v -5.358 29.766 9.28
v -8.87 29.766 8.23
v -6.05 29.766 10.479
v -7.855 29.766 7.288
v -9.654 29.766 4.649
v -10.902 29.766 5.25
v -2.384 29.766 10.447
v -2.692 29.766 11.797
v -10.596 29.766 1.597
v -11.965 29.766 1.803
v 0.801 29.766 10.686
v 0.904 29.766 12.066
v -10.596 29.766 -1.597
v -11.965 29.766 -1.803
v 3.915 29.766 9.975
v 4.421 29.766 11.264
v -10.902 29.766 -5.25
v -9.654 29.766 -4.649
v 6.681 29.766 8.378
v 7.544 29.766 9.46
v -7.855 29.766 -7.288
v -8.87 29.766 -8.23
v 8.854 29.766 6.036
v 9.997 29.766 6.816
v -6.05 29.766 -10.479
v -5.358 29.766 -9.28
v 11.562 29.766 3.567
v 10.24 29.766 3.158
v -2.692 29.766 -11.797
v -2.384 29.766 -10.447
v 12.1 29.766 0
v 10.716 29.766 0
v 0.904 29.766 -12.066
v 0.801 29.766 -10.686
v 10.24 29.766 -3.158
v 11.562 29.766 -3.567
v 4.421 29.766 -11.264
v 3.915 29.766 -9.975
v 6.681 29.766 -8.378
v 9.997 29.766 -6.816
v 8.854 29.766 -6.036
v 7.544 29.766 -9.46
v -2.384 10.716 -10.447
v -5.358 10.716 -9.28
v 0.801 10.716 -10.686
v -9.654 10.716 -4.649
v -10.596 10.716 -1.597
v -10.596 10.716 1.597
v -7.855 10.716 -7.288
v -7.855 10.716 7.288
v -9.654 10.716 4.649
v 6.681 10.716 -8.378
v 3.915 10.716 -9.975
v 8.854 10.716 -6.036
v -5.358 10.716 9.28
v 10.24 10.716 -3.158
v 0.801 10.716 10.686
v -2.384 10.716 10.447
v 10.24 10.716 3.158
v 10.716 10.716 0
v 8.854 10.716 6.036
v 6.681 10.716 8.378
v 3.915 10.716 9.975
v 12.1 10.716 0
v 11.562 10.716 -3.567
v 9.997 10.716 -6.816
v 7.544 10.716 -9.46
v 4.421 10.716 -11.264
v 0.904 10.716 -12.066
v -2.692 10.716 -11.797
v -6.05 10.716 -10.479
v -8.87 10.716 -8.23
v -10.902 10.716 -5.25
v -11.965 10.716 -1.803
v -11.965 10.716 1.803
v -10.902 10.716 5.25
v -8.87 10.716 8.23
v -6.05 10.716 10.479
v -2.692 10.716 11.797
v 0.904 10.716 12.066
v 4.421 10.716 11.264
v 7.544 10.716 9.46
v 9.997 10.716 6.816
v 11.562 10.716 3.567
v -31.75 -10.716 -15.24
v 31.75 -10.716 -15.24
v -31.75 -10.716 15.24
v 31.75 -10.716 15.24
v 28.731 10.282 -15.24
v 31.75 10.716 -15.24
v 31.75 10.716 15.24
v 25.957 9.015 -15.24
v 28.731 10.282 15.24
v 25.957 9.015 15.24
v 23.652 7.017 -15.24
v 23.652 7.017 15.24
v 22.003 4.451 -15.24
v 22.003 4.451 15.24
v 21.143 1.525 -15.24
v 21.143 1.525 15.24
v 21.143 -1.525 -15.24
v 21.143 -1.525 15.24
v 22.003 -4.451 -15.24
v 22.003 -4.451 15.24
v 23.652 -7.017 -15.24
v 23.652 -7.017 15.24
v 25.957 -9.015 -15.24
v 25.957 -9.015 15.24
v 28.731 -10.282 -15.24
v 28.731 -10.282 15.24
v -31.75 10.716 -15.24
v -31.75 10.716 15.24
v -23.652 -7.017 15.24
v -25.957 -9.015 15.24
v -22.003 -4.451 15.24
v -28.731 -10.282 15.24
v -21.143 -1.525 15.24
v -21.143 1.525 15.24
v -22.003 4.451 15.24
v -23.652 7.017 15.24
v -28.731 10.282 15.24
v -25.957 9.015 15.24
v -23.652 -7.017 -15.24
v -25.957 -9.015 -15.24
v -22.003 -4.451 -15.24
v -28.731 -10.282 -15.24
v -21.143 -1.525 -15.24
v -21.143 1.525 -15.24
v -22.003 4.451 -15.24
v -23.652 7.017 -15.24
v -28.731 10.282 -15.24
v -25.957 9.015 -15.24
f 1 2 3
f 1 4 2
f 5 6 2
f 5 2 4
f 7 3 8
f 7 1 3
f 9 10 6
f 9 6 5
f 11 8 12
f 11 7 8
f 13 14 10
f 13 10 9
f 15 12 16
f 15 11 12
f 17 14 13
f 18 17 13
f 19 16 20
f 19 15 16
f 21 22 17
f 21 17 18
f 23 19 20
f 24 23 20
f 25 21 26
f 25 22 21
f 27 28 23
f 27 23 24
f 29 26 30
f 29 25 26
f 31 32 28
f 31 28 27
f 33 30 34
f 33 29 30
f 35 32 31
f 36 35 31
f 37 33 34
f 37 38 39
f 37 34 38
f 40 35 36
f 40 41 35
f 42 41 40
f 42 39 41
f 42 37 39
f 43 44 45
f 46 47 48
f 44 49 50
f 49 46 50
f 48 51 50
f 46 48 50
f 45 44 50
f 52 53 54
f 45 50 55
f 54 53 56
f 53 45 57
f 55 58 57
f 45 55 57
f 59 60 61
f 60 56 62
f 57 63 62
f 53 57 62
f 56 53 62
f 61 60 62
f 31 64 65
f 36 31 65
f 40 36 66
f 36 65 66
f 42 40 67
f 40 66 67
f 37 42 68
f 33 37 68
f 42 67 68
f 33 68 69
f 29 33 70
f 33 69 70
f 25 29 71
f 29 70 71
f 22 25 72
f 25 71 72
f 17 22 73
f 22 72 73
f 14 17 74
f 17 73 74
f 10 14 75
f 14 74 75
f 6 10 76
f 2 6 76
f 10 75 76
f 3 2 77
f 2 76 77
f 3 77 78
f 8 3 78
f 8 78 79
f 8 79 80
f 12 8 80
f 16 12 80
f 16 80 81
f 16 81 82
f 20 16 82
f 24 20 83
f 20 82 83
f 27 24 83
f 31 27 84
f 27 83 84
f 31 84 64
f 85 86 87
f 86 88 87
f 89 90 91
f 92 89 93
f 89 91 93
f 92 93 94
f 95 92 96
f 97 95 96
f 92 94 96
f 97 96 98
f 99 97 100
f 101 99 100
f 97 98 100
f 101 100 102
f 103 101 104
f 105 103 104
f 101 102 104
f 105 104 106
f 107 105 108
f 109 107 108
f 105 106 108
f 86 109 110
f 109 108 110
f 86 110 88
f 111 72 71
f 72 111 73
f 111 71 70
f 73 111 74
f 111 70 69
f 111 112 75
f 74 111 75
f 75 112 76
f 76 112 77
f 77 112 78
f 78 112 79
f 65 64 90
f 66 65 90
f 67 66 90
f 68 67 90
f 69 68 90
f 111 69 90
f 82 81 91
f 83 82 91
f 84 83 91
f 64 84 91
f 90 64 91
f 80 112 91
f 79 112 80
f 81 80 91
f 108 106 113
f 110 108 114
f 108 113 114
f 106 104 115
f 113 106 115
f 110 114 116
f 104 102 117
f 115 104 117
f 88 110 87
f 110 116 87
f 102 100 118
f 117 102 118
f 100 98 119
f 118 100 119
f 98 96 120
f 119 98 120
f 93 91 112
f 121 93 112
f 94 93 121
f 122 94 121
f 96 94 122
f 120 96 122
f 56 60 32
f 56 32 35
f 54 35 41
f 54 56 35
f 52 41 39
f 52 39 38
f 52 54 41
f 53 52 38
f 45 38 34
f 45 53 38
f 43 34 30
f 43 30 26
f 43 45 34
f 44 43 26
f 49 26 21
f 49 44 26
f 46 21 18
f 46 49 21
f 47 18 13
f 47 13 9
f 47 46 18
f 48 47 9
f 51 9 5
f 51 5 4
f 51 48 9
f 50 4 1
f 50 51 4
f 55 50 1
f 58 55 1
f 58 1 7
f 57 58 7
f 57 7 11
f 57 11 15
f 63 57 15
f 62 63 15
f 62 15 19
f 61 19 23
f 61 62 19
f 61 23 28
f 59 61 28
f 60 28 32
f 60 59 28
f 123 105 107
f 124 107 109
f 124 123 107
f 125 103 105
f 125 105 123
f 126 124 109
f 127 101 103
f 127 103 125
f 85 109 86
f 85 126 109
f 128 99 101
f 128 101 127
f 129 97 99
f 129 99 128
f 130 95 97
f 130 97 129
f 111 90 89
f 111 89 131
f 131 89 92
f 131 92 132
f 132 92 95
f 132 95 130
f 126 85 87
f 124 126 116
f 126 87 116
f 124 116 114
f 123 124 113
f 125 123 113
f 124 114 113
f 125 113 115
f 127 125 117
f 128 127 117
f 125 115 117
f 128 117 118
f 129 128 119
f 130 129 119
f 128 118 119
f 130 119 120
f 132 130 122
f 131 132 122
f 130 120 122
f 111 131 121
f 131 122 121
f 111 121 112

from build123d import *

# Parameters (mm, degrees)
BOSS_EXTRUDE2_DEPTH = 15.24
SKETCH3_R           = 12.099925
SKETCH3_R_2         = 10.715625
BOSS_EXTRUDE3_DEPTH = 19.05


with BuildPart() as part:
    # Sketch1 → Boss-Extrude2 (new, symmetric)
    with BuildSketch(Plane.XY):
        with BuildLine():
            Line((-31.75, 10.715625), (31.75, 10.715625))
            ThreePointArc((31.75, 10.715625), (21.034375, 0), (31.75, -10.715625))
            Line((31.75, -10.715625), (-31.75, -10.715625))
            ThreePointArc((-31.75, -10.715625), (-21.034375, 0), (-31.75, 10.715625))
        make_face()
    extrude(amount=BOSS_EXTRUDE2_DEPTH, both=True)

    # Sketch3 → Boss-Extrude3 (add)
    with BuildSketch(Plane(origin=(0, 10.715625, 0), x_dir=(1, 0, 0), z_dir=(0, 1, 0))):
        Circle(SKETCH3_R)
        Circle(SKETCH3_R_2, mode=Mode.SUBTRACT)
    extrude(amount=BOSS_EXTRUDE3_DEPTH)


solid = part.part
